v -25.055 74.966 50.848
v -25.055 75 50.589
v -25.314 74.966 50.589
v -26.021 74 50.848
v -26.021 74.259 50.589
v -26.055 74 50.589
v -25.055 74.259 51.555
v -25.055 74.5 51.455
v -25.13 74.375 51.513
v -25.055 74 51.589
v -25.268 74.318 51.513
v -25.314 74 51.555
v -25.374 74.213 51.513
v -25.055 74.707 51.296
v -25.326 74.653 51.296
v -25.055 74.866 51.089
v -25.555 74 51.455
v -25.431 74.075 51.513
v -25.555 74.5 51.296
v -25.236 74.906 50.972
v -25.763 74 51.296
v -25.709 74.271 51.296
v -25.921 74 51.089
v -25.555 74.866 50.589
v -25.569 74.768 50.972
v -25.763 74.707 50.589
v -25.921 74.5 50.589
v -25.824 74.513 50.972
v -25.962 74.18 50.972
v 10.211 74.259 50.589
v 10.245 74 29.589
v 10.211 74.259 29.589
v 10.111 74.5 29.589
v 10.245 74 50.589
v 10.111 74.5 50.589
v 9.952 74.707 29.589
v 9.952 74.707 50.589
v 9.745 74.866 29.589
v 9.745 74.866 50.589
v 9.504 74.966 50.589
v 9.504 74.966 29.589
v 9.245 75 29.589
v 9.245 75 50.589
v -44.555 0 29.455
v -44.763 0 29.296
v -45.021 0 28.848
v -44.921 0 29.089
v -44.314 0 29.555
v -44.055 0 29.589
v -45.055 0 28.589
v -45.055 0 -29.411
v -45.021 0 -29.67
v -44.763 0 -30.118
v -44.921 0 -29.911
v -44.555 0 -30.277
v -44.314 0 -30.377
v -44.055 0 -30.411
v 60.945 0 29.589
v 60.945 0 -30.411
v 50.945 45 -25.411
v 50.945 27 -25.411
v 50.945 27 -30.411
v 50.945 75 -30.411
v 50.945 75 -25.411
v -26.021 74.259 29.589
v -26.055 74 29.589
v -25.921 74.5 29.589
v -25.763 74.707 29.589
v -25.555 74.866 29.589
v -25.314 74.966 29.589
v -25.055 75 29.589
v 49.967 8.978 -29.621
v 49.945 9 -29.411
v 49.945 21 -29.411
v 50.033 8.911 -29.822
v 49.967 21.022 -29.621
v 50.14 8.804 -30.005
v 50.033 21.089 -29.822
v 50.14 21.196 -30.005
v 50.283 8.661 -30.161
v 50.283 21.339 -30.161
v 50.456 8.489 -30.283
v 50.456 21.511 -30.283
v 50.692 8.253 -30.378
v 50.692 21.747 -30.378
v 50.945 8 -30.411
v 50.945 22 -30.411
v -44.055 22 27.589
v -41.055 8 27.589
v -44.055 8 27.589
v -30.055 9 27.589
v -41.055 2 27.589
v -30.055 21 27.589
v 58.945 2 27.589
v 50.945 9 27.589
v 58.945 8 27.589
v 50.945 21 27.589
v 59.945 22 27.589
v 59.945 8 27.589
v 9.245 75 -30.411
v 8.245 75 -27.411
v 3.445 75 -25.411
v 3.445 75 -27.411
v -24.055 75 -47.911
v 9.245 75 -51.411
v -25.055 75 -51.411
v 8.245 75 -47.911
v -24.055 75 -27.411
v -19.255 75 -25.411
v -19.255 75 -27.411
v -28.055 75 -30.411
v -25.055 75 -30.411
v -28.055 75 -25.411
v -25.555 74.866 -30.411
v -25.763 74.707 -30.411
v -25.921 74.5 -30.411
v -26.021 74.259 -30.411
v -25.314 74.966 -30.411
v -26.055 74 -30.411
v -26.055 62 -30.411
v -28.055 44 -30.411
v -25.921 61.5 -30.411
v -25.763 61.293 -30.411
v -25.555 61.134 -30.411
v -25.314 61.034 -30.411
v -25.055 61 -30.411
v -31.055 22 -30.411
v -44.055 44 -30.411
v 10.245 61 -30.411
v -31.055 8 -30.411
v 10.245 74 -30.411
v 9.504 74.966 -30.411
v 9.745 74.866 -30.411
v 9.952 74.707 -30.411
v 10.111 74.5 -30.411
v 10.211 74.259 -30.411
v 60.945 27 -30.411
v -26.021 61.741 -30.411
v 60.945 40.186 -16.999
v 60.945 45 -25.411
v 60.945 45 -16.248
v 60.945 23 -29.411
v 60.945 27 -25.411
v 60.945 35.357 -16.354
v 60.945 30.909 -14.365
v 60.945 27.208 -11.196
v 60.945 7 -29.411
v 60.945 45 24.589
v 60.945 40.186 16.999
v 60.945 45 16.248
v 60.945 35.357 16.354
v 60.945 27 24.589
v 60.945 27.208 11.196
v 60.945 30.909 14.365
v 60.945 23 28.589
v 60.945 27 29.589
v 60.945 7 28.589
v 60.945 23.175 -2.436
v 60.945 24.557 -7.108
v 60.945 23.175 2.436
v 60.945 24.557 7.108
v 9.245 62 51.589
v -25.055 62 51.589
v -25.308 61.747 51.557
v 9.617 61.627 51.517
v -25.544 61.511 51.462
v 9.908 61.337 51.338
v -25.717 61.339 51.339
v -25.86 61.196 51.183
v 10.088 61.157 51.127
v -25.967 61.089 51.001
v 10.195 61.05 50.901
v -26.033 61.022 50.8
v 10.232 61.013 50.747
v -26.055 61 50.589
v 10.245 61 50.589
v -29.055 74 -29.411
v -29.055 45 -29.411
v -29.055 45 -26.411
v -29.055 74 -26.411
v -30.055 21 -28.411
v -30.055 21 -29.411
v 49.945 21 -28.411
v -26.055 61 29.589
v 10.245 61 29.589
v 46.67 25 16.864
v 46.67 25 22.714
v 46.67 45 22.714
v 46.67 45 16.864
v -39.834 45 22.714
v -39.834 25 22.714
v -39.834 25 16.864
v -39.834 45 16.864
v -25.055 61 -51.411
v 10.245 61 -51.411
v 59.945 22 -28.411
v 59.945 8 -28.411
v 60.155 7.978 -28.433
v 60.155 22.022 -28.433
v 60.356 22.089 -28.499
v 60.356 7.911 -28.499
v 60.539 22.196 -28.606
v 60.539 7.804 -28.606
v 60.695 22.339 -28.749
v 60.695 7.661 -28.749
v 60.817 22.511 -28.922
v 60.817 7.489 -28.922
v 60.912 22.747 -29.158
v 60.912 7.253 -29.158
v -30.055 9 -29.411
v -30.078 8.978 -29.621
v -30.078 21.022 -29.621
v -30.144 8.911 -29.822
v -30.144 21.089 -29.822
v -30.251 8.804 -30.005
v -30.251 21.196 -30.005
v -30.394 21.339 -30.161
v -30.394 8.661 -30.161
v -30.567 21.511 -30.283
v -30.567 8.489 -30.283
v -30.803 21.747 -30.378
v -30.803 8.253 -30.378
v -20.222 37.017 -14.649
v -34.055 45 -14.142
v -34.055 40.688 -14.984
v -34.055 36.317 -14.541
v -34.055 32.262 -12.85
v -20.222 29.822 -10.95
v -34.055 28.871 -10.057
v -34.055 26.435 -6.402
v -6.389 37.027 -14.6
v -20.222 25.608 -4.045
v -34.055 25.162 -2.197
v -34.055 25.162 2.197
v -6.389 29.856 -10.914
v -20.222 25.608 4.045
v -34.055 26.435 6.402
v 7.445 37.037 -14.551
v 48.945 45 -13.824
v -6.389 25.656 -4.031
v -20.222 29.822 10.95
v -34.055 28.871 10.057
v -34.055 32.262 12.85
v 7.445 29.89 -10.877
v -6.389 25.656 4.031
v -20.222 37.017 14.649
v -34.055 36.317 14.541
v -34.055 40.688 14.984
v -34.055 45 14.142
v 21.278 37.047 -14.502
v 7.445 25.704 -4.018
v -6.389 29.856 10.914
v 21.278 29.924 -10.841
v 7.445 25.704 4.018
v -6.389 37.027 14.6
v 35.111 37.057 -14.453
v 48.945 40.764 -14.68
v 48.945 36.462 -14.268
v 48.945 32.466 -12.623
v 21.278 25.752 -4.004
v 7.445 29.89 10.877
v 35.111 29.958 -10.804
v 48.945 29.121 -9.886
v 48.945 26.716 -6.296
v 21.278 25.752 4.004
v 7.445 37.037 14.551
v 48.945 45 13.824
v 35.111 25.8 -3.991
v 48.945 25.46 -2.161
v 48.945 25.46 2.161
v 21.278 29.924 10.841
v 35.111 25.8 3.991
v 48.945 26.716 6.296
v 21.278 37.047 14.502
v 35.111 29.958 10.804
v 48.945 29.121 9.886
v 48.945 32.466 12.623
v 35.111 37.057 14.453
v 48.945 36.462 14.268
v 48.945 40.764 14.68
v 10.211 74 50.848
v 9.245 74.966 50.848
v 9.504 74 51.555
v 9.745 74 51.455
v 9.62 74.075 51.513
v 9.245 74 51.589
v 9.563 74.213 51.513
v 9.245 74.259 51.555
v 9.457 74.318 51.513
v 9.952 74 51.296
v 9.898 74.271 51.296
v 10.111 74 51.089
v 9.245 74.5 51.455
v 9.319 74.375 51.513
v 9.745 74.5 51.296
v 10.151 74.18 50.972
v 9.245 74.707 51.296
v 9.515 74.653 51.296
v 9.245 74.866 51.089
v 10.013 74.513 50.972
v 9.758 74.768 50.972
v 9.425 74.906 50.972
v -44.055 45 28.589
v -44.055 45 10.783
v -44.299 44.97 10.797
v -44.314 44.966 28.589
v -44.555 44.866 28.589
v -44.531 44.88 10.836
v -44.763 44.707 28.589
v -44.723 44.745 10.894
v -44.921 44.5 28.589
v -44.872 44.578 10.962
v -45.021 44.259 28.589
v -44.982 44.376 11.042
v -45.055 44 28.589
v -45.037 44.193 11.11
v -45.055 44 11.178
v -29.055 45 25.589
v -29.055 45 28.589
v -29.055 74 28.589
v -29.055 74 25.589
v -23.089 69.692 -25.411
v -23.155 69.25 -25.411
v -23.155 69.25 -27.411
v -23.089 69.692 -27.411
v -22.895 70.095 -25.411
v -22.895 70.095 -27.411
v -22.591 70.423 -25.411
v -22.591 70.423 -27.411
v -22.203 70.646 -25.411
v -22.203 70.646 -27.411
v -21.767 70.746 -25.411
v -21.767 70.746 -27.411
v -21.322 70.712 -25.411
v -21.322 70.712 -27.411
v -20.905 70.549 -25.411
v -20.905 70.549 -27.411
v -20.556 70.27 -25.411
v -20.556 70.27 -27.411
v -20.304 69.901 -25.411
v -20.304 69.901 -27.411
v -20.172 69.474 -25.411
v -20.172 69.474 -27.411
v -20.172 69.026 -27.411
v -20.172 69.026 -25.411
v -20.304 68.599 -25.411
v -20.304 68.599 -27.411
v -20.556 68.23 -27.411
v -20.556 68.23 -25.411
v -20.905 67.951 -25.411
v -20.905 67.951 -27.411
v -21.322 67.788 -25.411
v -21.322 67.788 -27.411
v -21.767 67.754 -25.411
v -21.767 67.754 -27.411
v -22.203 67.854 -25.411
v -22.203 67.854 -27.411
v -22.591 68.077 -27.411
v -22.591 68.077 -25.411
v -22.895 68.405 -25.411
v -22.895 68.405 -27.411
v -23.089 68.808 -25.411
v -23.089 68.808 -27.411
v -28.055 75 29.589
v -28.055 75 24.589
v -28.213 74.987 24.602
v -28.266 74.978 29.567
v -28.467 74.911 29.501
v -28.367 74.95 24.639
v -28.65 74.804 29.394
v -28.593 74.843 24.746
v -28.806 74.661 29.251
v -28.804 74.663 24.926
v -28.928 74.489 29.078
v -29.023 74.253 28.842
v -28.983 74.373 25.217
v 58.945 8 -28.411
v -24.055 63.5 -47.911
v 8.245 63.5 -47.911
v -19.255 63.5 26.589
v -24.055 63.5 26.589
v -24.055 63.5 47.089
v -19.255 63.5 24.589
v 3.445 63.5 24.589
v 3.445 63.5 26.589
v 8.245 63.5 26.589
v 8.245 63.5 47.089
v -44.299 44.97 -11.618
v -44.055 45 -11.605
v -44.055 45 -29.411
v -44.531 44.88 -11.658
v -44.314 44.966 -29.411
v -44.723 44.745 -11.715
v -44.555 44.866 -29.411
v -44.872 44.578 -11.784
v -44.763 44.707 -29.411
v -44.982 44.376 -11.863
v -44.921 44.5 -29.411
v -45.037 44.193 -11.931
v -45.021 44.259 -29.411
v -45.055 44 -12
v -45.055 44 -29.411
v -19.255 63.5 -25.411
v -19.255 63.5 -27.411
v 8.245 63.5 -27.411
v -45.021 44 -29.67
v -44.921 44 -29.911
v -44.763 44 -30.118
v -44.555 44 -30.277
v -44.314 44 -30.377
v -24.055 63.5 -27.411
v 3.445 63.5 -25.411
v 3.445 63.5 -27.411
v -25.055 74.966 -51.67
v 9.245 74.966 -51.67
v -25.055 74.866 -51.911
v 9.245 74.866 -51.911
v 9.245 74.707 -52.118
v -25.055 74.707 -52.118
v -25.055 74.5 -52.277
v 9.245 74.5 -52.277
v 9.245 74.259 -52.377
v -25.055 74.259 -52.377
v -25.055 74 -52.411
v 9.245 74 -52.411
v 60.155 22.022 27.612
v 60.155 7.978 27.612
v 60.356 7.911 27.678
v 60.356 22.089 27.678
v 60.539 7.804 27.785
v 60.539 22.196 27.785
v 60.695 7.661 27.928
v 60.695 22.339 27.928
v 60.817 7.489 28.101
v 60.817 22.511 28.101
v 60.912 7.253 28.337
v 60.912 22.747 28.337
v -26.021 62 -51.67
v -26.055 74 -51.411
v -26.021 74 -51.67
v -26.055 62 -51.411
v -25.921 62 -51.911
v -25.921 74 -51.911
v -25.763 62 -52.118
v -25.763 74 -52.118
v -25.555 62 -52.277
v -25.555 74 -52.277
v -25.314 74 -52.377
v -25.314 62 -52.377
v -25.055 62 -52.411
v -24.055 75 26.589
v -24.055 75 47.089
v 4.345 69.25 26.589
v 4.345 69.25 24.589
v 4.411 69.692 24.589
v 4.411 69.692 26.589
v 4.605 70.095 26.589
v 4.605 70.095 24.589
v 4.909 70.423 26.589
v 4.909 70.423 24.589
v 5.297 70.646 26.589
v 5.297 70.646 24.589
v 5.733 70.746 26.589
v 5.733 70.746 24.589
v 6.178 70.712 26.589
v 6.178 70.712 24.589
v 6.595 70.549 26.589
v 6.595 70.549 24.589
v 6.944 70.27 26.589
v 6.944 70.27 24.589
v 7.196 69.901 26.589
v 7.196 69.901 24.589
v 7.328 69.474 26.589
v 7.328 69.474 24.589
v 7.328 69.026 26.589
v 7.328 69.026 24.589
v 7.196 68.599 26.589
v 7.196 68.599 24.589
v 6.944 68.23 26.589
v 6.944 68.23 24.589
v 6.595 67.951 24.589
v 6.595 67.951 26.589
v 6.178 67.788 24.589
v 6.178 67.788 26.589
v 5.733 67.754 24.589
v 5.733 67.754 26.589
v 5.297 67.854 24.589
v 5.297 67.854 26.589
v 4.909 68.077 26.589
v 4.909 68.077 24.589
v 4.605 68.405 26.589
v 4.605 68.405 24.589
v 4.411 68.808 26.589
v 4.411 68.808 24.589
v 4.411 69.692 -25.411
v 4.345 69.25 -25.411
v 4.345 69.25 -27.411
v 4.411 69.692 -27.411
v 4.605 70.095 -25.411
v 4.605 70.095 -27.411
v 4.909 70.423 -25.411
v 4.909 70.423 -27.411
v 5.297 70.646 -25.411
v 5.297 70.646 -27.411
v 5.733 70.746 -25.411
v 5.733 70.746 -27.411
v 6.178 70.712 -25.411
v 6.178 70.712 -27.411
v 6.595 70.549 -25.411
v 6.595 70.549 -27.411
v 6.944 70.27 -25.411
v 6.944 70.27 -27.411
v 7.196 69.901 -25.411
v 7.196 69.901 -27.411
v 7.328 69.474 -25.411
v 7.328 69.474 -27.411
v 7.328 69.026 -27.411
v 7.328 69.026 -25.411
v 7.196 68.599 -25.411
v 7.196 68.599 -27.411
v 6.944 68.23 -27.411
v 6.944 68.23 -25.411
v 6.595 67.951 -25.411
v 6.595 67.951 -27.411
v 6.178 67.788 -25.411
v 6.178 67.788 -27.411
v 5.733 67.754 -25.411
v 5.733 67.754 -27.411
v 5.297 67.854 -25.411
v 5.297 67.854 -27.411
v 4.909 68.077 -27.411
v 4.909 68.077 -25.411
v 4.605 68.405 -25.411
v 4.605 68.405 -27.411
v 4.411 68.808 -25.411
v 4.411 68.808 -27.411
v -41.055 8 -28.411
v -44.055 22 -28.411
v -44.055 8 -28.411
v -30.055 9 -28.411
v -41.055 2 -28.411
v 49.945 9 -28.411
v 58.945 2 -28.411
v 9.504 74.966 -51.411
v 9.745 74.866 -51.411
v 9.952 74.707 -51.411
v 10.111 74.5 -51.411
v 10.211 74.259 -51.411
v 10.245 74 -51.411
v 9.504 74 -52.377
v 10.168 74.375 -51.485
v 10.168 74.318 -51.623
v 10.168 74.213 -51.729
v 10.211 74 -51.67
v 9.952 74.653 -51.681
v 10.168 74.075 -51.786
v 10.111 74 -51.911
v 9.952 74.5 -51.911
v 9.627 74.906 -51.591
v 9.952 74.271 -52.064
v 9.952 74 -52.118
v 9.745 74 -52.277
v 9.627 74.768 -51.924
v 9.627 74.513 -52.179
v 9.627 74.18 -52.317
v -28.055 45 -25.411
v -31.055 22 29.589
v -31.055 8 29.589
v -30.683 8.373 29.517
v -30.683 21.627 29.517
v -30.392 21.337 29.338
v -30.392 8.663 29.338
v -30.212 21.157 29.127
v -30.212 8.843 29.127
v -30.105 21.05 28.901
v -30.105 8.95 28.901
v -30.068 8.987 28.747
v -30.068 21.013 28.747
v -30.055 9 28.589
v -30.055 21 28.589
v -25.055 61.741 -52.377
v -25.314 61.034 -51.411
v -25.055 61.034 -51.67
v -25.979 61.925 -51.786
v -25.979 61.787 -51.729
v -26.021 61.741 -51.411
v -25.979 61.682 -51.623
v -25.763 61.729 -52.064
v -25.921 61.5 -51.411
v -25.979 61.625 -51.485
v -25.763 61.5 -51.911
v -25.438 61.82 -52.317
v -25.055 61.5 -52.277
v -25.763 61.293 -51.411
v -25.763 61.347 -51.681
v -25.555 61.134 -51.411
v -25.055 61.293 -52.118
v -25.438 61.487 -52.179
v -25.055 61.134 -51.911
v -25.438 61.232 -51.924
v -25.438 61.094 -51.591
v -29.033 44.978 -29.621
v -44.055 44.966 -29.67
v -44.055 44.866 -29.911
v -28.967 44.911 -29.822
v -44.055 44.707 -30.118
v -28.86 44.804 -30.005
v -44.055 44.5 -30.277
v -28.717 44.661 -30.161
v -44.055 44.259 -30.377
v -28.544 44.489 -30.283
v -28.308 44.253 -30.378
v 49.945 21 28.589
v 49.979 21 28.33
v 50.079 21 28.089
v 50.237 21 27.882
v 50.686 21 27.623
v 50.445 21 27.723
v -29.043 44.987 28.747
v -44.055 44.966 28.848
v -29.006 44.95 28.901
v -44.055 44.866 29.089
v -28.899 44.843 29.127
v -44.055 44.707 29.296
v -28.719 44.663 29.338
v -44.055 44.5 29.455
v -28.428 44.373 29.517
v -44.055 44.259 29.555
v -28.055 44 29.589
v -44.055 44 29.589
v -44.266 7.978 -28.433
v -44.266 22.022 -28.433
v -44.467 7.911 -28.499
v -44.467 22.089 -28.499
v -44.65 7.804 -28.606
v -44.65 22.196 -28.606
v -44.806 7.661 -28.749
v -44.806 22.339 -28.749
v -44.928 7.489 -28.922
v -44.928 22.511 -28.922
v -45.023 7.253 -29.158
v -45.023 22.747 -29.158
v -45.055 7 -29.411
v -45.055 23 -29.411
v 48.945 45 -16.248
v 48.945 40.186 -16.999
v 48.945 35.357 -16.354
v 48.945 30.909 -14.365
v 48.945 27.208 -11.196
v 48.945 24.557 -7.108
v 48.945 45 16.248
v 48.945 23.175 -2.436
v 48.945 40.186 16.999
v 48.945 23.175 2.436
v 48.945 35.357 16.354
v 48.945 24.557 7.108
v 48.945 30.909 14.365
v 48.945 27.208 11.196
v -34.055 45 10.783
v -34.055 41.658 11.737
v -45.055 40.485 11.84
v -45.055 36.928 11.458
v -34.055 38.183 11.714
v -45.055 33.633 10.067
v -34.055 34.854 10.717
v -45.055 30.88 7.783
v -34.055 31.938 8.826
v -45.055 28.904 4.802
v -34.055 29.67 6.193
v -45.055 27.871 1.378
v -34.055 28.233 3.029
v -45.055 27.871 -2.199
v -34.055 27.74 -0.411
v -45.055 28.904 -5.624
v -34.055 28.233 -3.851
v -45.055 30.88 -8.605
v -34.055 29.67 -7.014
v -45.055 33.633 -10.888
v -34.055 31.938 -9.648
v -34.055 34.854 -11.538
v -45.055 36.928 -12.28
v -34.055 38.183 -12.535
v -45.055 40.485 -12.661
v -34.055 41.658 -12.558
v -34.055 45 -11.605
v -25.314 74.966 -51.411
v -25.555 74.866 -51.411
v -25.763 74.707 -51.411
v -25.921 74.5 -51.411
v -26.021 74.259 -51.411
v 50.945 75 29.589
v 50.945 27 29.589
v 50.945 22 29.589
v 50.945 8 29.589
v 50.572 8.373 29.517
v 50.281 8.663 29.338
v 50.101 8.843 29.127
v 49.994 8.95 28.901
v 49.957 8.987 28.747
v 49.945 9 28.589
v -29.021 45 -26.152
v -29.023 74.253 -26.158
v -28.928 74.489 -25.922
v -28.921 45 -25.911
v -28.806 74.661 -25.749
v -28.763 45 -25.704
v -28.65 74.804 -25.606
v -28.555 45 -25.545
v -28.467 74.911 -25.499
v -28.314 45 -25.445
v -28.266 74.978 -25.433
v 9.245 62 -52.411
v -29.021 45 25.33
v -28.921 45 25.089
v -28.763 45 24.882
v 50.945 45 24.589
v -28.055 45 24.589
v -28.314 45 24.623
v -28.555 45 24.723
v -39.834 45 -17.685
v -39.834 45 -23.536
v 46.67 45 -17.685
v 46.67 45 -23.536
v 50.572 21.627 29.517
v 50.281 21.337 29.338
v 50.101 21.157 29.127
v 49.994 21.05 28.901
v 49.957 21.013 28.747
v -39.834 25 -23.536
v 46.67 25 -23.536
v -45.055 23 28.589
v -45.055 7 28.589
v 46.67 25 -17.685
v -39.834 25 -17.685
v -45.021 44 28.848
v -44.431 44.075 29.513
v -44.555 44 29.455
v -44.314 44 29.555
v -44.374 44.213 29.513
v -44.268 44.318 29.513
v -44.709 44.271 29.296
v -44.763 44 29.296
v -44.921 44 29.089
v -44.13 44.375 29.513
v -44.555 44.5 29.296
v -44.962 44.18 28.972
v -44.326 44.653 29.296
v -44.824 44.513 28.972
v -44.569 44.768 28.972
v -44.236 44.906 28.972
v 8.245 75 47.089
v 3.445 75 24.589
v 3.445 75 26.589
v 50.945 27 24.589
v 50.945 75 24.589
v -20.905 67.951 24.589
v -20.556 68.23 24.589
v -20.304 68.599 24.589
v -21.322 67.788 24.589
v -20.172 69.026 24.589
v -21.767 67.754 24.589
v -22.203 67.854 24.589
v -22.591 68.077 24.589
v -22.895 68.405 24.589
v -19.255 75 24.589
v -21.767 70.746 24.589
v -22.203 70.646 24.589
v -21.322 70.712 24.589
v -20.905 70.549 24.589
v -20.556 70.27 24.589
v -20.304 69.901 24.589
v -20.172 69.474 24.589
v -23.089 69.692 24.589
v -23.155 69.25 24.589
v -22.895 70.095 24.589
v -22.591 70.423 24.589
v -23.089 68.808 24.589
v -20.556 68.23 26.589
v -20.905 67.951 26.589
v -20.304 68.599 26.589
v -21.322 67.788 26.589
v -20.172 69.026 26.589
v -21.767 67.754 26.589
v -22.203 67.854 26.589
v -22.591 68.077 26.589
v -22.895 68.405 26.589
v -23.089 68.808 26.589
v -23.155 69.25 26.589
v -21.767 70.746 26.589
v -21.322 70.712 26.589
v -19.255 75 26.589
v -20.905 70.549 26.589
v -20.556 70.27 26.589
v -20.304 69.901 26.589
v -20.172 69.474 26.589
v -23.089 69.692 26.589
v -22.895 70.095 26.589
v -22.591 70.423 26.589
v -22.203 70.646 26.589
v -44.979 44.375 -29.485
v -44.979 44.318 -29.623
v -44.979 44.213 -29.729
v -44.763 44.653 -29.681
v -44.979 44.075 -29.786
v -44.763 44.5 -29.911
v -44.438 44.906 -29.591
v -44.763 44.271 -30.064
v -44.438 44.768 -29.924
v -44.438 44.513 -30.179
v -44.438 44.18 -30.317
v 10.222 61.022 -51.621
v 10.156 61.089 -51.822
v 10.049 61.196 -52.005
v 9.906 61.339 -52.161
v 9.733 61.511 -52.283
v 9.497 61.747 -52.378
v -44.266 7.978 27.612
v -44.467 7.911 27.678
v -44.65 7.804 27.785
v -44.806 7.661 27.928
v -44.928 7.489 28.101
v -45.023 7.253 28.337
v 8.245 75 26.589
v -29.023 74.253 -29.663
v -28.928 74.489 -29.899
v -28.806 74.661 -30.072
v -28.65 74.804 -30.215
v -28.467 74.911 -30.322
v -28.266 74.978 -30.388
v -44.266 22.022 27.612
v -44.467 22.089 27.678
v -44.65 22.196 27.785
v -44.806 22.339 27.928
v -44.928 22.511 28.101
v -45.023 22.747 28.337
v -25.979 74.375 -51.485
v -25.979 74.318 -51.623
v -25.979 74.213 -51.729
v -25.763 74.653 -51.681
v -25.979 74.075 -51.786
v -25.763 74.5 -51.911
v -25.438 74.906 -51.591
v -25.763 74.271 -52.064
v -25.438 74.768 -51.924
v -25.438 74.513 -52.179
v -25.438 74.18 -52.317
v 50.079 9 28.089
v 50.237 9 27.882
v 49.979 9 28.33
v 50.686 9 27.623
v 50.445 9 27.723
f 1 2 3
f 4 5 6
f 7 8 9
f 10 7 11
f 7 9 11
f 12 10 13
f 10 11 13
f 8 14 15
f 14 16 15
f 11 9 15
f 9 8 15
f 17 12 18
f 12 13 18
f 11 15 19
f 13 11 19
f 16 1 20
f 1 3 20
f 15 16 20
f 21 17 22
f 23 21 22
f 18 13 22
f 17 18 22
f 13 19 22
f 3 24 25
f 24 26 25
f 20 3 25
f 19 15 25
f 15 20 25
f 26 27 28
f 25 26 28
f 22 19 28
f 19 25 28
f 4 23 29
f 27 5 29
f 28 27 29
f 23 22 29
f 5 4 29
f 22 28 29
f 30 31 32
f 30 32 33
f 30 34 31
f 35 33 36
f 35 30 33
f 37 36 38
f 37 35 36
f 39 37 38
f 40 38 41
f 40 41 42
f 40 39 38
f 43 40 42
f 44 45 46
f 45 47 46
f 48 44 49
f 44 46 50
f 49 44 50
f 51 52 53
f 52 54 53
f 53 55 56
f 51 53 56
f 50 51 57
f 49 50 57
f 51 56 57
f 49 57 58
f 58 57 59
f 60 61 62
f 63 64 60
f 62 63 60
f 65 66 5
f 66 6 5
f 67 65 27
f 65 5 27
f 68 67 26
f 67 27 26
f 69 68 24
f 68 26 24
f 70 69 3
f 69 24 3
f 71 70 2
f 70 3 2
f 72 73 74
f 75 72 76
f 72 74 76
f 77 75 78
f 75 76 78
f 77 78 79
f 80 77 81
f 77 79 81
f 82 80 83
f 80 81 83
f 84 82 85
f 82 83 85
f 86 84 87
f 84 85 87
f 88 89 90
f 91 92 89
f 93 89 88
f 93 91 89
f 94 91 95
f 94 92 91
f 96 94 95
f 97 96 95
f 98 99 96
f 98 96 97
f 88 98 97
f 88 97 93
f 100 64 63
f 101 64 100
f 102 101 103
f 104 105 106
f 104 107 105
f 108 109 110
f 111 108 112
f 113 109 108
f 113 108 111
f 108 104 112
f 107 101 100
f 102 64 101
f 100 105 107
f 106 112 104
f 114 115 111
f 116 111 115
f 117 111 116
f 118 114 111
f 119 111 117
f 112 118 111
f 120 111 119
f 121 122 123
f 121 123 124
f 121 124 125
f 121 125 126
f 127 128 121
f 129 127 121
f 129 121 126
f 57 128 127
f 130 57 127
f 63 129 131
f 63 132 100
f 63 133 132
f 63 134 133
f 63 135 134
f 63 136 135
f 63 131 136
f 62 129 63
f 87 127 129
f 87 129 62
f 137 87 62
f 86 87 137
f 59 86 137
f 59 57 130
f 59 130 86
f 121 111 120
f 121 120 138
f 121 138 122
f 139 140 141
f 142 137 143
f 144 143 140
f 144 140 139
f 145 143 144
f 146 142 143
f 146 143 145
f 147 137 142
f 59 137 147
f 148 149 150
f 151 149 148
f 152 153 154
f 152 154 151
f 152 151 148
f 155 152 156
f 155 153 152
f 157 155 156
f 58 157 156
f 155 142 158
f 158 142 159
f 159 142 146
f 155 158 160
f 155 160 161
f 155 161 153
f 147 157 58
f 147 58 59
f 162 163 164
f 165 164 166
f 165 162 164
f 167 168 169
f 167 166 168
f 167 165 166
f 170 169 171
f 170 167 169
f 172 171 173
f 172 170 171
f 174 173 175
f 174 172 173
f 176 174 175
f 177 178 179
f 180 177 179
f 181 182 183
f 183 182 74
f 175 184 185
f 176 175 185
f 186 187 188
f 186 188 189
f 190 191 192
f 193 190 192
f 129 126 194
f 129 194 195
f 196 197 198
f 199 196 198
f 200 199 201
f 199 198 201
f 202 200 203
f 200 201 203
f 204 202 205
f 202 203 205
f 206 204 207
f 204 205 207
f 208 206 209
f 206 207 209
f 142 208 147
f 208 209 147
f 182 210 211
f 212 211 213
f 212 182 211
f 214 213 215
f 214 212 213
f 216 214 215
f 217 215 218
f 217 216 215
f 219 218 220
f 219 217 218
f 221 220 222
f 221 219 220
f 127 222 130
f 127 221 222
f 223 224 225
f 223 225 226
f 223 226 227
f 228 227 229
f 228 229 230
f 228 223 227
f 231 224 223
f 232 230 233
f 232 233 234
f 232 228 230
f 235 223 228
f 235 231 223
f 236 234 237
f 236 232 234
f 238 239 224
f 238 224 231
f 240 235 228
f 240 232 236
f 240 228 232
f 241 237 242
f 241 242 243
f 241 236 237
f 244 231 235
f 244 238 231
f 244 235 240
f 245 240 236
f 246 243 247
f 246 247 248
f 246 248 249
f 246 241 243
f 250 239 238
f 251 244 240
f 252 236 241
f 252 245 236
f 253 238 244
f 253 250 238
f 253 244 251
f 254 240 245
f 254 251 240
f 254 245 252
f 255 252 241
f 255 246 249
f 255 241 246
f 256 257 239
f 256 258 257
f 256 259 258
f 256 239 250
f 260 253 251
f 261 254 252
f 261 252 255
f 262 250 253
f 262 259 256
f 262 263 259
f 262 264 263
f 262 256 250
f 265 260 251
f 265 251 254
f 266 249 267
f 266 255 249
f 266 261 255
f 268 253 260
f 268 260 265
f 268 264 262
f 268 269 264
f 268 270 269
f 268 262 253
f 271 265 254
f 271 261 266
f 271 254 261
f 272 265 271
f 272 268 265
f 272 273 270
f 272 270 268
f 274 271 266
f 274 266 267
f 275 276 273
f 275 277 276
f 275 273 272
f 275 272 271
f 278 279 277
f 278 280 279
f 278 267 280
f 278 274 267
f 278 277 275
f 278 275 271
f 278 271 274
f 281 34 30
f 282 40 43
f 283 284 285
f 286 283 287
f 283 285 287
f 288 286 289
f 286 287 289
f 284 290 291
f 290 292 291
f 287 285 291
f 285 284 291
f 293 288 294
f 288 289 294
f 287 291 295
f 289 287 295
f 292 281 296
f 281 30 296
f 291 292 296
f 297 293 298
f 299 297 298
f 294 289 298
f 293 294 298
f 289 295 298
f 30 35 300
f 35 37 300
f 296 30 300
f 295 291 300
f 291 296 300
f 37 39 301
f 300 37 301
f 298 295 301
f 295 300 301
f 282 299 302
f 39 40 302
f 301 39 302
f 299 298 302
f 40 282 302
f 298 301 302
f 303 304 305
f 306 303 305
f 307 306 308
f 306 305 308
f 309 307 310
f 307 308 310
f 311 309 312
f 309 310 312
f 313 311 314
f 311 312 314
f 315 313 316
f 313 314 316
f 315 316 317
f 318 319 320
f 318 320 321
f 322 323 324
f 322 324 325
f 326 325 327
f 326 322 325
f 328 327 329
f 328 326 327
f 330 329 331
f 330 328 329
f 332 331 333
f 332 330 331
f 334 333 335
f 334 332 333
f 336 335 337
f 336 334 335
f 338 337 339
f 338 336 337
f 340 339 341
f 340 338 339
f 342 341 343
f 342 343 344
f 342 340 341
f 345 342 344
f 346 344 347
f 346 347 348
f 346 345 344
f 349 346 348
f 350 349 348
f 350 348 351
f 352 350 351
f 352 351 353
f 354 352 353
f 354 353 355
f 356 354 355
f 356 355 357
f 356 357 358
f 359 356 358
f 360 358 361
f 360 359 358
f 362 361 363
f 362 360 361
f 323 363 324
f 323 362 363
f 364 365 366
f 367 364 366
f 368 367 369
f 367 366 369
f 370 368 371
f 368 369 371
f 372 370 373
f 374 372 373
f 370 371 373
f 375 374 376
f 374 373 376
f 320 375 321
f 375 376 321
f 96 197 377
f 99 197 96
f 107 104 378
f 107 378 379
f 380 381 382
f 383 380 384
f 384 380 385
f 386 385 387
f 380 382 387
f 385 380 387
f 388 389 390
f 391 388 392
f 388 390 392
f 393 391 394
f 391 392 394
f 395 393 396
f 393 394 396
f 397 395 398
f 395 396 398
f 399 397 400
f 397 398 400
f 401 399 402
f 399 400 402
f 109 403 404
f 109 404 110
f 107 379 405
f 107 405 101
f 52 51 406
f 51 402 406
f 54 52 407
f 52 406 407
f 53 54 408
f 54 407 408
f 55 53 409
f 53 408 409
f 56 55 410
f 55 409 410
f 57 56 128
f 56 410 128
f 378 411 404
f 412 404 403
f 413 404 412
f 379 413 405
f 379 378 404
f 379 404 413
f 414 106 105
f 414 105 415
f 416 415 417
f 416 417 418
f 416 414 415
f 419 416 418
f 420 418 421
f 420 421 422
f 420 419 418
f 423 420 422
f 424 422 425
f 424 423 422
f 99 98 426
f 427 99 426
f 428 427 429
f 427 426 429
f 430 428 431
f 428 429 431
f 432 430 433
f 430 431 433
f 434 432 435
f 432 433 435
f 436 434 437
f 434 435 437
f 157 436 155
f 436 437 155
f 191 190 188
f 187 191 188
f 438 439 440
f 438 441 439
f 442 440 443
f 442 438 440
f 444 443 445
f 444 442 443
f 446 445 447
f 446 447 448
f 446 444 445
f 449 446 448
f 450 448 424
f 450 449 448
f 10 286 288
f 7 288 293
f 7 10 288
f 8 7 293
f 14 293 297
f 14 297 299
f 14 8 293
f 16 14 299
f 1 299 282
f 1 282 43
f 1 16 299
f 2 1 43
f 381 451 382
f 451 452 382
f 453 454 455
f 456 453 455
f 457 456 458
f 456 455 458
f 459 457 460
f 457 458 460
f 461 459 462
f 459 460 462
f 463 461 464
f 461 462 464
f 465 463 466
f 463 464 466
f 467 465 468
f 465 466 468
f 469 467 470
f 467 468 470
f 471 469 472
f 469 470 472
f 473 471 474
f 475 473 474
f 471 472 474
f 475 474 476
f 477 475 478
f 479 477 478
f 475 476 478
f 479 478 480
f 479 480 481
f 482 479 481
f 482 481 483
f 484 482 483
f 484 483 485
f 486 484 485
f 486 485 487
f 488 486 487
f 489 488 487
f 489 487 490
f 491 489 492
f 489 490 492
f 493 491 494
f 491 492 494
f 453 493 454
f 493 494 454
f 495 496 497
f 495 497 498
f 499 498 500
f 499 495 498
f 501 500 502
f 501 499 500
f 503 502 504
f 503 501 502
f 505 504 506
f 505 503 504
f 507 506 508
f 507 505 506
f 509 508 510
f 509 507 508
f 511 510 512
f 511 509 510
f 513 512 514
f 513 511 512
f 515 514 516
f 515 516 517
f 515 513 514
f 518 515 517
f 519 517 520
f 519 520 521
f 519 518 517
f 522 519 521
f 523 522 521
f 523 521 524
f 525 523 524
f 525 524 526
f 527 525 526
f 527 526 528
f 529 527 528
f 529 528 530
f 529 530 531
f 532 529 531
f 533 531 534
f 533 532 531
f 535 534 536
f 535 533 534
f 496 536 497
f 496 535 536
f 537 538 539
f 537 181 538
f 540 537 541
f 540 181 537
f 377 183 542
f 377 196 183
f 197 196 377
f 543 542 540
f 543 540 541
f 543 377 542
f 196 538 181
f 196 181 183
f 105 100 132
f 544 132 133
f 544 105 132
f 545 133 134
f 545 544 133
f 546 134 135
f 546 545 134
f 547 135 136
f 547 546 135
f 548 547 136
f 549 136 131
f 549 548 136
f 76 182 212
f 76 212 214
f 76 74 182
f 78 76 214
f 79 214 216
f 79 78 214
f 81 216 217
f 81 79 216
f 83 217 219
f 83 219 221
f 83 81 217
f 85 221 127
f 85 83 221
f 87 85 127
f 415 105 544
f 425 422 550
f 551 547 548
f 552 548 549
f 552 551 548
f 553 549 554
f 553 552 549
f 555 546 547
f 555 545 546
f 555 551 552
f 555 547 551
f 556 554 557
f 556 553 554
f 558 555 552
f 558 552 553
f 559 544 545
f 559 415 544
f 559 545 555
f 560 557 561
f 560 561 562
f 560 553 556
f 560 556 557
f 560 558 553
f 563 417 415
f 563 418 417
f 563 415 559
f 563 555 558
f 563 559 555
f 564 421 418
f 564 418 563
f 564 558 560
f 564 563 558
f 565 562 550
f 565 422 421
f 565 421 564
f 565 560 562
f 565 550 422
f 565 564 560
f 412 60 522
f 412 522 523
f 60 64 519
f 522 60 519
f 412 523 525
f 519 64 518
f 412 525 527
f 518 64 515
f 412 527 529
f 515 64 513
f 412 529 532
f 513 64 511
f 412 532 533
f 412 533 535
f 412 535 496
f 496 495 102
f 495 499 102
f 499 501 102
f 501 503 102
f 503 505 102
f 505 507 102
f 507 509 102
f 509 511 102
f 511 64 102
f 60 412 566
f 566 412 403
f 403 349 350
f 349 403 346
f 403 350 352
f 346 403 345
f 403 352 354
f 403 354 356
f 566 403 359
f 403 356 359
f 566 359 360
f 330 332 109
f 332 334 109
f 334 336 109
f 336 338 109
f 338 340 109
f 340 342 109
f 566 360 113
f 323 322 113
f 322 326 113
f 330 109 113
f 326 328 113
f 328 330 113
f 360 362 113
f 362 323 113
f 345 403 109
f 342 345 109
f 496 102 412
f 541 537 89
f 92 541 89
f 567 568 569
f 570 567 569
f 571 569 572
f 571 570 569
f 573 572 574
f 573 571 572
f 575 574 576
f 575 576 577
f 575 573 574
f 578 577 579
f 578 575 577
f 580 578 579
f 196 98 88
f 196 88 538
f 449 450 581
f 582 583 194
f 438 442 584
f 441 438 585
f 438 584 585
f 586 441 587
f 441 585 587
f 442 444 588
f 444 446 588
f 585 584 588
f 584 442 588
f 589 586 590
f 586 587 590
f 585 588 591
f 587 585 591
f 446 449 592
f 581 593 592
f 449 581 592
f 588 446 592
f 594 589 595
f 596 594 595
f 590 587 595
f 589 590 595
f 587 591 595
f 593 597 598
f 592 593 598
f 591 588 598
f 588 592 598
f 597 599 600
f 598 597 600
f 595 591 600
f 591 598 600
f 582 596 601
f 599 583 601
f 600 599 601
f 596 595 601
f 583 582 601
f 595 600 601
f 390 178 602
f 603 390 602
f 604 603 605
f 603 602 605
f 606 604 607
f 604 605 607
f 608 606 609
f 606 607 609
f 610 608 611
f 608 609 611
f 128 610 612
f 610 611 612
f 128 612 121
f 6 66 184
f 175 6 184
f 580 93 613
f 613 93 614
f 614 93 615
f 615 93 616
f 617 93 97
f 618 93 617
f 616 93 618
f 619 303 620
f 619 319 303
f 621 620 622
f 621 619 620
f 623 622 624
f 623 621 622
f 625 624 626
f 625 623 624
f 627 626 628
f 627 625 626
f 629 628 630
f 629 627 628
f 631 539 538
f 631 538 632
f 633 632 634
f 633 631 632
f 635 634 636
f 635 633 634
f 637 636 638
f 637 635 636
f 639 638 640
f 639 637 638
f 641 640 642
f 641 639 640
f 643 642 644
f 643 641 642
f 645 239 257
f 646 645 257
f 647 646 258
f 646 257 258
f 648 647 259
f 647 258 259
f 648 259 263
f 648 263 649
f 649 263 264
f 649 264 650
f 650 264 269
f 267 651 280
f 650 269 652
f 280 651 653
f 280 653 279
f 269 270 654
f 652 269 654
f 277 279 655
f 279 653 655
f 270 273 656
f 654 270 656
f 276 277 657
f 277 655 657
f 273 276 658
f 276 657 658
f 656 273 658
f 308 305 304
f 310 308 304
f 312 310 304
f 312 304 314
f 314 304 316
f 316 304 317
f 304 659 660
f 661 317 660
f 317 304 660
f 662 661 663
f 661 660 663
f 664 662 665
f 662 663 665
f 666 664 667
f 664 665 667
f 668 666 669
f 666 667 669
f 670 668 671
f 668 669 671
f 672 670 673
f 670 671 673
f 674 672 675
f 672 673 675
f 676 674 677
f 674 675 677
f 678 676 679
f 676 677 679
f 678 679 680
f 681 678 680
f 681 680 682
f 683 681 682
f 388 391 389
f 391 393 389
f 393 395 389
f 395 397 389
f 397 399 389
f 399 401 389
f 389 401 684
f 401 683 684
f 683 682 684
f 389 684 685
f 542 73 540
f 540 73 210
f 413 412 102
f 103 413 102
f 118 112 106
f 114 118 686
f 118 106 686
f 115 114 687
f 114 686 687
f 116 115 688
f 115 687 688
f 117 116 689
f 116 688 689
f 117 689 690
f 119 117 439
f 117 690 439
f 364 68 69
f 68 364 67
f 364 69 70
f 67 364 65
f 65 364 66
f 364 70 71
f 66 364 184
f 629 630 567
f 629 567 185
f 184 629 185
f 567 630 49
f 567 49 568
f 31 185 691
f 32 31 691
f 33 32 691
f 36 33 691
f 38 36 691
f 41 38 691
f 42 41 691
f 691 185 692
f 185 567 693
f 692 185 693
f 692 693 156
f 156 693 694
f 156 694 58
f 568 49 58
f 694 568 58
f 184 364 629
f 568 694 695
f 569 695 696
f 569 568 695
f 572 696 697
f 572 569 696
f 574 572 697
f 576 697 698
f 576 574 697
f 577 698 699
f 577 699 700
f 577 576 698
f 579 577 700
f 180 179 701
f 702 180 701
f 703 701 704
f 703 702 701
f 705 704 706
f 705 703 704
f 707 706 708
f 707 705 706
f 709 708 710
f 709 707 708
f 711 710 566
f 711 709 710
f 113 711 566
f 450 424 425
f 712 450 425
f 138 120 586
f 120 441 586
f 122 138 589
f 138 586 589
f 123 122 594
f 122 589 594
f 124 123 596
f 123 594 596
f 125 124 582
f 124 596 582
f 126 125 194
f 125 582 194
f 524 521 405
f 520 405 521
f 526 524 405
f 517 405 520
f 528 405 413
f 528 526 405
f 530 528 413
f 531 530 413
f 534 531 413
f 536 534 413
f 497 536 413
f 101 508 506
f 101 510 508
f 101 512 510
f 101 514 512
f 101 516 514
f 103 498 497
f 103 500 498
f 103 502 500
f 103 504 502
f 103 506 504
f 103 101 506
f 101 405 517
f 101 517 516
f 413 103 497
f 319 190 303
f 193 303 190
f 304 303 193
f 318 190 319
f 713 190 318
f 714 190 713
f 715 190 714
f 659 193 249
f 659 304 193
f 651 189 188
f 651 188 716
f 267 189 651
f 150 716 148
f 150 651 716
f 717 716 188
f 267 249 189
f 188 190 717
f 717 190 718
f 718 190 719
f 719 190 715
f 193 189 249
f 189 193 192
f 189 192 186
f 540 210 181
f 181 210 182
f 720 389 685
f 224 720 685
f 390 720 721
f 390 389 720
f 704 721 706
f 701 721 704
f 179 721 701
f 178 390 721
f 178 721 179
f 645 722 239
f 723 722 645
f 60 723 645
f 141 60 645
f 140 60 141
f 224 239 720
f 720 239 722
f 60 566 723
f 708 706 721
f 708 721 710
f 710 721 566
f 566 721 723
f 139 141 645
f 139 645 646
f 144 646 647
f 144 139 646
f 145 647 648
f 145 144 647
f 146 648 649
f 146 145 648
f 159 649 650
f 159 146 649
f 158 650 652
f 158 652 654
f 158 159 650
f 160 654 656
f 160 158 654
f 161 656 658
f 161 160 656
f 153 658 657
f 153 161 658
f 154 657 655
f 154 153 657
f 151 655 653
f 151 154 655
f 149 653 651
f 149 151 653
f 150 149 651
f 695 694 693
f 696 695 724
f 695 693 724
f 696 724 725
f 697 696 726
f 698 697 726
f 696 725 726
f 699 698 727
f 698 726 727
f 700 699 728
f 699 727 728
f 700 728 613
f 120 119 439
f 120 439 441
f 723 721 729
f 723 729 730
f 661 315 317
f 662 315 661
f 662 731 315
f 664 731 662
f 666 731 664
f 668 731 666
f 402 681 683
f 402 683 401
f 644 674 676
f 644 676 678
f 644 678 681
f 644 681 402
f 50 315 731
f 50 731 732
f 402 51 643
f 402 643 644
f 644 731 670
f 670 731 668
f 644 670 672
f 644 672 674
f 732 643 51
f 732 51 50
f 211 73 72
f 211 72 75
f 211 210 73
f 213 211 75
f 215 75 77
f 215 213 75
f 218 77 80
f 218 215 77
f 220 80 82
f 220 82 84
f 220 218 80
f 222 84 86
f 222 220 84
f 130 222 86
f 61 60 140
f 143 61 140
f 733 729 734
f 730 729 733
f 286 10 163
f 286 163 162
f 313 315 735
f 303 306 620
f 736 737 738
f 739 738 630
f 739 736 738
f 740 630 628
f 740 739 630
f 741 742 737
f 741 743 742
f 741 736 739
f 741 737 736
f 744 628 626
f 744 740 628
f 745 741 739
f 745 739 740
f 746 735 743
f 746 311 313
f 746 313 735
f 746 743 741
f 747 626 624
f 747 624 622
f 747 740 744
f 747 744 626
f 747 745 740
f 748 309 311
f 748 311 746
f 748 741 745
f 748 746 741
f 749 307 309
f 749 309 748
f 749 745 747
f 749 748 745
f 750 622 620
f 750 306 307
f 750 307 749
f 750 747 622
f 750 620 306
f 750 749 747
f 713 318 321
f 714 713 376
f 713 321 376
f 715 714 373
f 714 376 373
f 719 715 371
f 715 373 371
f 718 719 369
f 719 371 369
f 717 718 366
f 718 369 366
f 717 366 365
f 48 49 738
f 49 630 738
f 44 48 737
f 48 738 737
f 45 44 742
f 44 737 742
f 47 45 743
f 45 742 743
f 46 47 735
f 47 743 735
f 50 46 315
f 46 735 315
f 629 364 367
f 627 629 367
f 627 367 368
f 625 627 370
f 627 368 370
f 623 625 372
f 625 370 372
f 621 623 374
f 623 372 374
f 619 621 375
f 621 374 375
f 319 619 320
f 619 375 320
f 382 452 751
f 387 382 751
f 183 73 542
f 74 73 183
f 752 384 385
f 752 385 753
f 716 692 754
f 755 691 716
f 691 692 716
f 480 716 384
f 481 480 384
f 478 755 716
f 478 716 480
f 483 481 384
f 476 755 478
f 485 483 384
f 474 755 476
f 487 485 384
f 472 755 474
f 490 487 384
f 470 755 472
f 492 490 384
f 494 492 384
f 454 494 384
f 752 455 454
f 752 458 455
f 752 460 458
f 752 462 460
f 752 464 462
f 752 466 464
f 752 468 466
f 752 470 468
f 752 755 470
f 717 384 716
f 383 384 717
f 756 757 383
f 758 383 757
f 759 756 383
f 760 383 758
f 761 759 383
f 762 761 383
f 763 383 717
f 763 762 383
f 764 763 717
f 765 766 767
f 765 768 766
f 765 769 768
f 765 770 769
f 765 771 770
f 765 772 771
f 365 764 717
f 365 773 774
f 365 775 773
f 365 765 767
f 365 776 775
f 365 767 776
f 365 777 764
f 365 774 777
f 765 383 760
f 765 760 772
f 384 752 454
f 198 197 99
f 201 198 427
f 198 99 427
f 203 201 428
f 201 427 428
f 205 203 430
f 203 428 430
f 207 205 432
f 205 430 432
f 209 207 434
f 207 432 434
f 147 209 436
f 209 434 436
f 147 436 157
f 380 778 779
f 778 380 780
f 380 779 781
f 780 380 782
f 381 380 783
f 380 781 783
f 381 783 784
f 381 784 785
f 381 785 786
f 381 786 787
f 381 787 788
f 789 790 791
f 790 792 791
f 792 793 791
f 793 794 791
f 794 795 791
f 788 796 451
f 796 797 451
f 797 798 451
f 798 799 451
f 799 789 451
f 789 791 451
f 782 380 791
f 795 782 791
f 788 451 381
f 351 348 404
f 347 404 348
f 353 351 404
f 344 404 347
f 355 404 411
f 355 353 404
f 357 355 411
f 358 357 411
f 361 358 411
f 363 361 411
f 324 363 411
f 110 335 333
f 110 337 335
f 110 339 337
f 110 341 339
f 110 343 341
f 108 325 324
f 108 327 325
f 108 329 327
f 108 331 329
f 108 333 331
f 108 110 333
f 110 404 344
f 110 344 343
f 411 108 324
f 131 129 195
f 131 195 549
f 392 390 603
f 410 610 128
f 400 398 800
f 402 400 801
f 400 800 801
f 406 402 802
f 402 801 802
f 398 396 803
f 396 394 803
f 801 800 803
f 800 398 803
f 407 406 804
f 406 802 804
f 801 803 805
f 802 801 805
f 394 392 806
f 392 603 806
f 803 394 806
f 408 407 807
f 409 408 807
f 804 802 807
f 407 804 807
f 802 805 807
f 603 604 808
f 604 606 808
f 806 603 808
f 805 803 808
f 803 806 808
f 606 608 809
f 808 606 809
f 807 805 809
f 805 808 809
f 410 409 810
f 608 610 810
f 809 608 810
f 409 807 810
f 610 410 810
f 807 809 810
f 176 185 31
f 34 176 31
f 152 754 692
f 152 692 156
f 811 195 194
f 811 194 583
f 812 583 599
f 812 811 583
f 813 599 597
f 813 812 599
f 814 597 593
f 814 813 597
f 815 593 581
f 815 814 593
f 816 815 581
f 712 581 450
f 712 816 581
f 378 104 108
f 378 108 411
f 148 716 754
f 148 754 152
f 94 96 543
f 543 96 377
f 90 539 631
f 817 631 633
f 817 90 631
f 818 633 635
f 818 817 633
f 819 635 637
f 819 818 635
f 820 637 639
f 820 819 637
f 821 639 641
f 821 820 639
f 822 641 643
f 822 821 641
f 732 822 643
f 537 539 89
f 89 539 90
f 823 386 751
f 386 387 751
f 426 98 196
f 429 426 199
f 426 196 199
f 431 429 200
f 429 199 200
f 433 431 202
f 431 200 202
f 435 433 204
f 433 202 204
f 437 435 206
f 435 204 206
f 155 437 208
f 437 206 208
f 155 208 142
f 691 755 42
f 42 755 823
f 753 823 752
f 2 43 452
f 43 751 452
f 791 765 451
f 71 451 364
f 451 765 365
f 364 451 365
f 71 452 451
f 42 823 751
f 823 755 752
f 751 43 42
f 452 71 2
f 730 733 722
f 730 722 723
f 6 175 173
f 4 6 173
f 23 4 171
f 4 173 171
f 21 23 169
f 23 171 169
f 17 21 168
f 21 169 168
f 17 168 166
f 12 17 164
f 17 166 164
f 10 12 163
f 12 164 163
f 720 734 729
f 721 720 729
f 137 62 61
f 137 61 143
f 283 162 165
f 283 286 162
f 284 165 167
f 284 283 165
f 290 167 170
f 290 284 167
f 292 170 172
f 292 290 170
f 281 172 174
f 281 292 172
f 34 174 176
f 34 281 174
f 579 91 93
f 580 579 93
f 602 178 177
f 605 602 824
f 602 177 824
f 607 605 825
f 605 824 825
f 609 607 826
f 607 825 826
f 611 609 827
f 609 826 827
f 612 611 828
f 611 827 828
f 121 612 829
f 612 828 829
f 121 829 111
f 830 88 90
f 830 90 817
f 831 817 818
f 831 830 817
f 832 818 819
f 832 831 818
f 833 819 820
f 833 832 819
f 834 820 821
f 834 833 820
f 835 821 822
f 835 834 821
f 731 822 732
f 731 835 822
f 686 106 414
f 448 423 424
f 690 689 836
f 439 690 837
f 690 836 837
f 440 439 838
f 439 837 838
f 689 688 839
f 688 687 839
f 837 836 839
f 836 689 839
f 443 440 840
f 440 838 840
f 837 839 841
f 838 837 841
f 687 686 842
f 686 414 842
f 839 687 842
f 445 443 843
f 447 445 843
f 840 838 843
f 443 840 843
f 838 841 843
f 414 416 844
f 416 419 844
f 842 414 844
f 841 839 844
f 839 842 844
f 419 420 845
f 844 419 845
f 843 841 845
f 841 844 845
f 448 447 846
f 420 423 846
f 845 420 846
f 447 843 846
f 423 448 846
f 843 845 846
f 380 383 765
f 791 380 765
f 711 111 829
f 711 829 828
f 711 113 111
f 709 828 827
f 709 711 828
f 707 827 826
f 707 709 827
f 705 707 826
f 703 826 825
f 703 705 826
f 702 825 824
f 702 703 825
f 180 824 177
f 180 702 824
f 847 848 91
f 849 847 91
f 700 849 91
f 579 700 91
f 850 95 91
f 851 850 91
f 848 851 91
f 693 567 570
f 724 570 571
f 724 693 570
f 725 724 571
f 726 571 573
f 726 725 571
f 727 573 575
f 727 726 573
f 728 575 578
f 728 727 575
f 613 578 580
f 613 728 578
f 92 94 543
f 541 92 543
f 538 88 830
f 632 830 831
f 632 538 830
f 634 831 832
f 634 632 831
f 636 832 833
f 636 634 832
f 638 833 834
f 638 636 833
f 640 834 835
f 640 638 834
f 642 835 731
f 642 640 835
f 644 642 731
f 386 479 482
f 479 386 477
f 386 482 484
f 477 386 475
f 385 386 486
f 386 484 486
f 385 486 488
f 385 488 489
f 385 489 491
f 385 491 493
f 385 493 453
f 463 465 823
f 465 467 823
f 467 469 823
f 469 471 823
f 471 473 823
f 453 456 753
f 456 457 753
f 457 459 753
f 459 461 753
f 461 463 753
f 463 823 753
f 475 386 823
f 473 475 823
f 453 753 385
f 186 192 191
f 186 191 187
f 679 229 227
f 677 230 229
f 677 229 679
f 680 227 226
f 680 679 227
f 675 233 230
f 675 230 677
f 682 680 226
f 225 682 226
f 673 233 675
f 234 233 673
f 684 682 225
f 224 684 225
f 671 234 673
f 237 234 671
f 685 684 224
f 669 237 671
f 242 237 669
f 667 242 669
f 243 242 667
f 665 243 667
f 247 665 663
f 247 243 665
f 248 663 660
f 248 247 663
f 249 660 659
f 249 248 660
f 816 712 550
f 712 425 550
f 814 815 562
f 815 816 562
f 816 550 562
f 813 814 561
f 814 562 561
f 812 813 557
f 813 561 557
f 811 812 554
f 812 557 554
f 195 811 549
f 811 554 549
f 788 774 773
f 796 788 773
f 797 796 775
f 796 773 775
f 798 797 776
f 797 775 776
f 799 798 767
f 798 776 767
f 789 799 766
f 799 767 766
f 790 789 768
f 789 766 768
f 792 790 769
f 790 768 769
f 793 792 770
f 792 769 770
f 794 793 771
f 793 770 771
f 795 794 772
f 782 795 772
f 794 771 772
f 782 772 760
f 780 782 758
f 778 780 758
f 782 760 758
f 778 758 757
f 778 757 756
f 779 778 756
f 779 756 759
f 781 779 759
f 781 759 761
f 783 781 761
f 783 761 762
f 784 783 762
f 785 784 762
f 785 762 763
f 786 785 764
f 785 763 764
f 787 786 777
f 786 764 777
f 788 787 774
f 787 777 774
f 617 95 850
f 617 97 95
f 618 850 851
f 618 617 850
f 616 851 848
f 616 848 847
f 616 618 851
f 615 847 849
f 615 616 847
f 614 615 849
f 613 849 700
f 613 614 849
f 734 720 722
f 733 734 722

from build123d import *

# Parameters (mm, degrees)
SKETCH_1_W             = 106
SKETCH_1_H             = 60
ARDUINO_DEPTH          = 45
ARDUINO_2_DEPTH        = 102
SKETCH_3_W             = 28
SKETCH_3_H             = 6
ARDUINO_3_DEPTH        = 2
SKETCH_4_W             = 40
SKETCH_4_H             = 12
ARDUINO_4_DEPTH        = 60
ARDUINO_5_DEPTH        = 5
SKETCH_11_W            = 12
SKETCH_11_H            = 17
SKETCH_13_R            = 12.26
CUT_EXTRUDE_2679_DEPTH = 110.42948373
SKETCH_25_W            = 90
SKETCH_25_H            = 5
EXTRUDE_3075_DEPTH     = 30
EXTRUDE_3668_DEPTH     = 22
CUT_EXTRUDE_1_REACH    = 115.751
CUT_EXTRUDE_2_DEPTH    = 17.5
SKETCH_28_W            = 4.8
SKETCH_28_H            = 11.5
SKETCH_28_R            = 1.5
EXTRUDE_4845_DEPTH     = 2
FILLET_1_R             = 1
SKETCH_30_W            = 10
SKETCH_30_H            = 5
CUT_EXTRUDE_2_2_DEPTH  = 48
SKETCH_32_W            = 86.504453115
SKETCH_32_H            = 5.850542723
SKETCH_32_H_2          = 5.850542722
CUT_EXTRUDE_4_DEPTH    = 20


with BuildPart() as part:
    # 草图1 → arduino (new body)
    with BuildSketch(Plane(origin=(0, 0, 0), x_dir=(1, 0, 0), z_dir=(0, 1, 0))):
        with Locations((7.944608655, 0.410719743)):
            Rectangle(SKETCH_1_W, SKETCH_1_H)
    extrude(amount=ARDUINO_DEPTH)

    # 草图2 → arduino 2 (cut)
    with BuildSketch(Plane(origin=(60.944608655, 0, 0), x_dir=(0, 0, -1), z_dir=(1, 0, 0))):
        Polygon((-27.589280257, 22), (28.410719743, 22), (28.410719743, 2), (0.410719743, 2), (-27.589280257, 2), align=None)
    extrude(amount=-ARDUINO_2_DEPTH, mode=Mode.SUBTRACT)

    # 草图3 → arduino 3 (add)
    with BuildSketch(Plane(origin=(60.944608655, 0, 0), x_dir=(0, 0, -1), z_dir=(1, 0, 0))):
        with Locations((14.410719743, 5)):
            Rectangle(SKETCH_3_W, SKETCH_3_H)
        with Locations((-13.589280257, 5)):
            Rectangle(SKETCH_3_W, SKETCH_3_H)
    extrude(amount=-ARDUINO_3_DEPTH)

    # 草图4 → arduino 4 (cut)
    with BuildSketch(Plane(origin=(0, 0, -30.410719743), x_dir=(-1, 0, 0), z_dir=(0, 0, -1))):
        with Locations((10.055391345, 15)):
            Rectangle(SKETCH_4_W, SKETCH_4_H)
        with Locations((-29.944608655, 15)):
            Rectangle(SKETCH_4_W, SKETCH_4_H)
    extrude(amount=-ARDUINO_4_DEPTH, mode=Mode.SUBTRACT)

    # 草图7 → arduino 5 (cut)
    with BuildSketch(Plane.ZY.offset(45.055391345)):
        Polygon((-0.410719743, 22), (-28.410719743, 22), (-28.410719743, 8), (27.589280257, 8), (27.589280257, 22), align=None)
    extrude(amount=-ARDUINO_5_DEPTH, mode=Mode.SUBTRACT)

    # 草图11 → Cut-Revolve 2344 (revolve, cut)
    with BuildSketch(Plane.XY):
        with Locations((54.944608655, 31.5)):
            Rectangle(SKETCH_11_W, SKETCH_11_H)
    revolve(axis=Axis((60.944608655, 40, 0), (-1, 0, 0)), mode=Mode.SUBTRACT)

    # 草图12 → Cut-Revolve 2556 (revolve, cut)
    with BuildSketch(Plane.XY):
        Polygon((48.944608655, 25.3), (48.944608655, 40), (-34.055391345, 40), (-34.055391345, 25), align=None)
    revolve(axis=Axis((48.944608655, 40, 0), (-1, 0, 0)), mode=Mode.SUBTRACT)

    # 草图13 → Cut-Extrude 2679 (cut, through all)
    with BuildSketch(Plane(origin=(-34.055391345, 0, 0), x_dir=(0, 0, -1), z_dir=(1, 0, 0))):
        with Locations((0.410719743, 40)):
            Circle(SKETCH_13_R)
    extrude(amount=-CUT_EXTRUDE_2679_DEPTH, mode=Mode.SUBTRACT)

    # 草图25 → Extrude 3075 (add)
    with BuildSketch(Plane(origin=(0, 45, 0), x_dir=(1, 0, 0), z_dir=(0, 1, 0))):
        with Locations((15.944608655, -27.089280257)):
            Rectangle(SKETCH_25_W, SKETCH_25_H)
    extrude_3075 = extrude(amount=EXTRUDE_3075_DEPTH)

    # 草图26 → Extrude 3668 (add)
    with BuildSketch(Plane.XY.offset(29.589280257)):
        Polygon((10.244608655, 61), (10.244608655, 75), (8.244608655, 75), (8.244608655, 63.5), (-24.055391345, 63.5), (-24.055391345, 75), (-26.055391345, 75), (-26.055391345, 61), align=None)
        Polygon((8.244608655, 63.5), (8.244608655, 75), (-16.055391345, 75), (-24.055391345, 75), (-24.055391345, 63.5), align=None)
    extrude_3668 = extrude(amount=EXTRUDE_3668_DEPTH)

    # 草图26<3> → 舵机舱切除1 (cut, up to next)
    with BuildSketch(Plane.XY.offset(29.589280257), mode=Mode.PRIVATE) as cut_extrude_1_sk1:
        Polygon((8.244608655, 63.5), (8.244608655, 75), (-16.055391345, 75), (-24.055391345, 75), (-24.055391345, 63.5), align=None)
    cut_extrude_1_tool1 = extrude(cut_extrude_1_sk1.sketch, amount=-CUT_EXTRUDE_1_REACH, mode=Mode.PRIVATE) & part.part
    cut_extrude_1 = cut_extrude_1_tool1.solids().sort_by_distance((-7.905391, 69.25, 29.58928))[0]
    add(cut_extrude_1, mode=Mode.SUBTRACT)

    # 草图26<4> → Cut-Extrude 2 (cut)
    with BuildSketch(Plane.XY.offset(29.589280257)):
        Polygon((8.244608655, 63.5), (8.244608655, 75), (-16.055391345, 75), (-24.055391345, 75), (-24.055391345, 63.5), align=None)
    cut_extrude_2 = extrude(amount=CUT_EXTRUDE_2_DEPTH, mode=Mode.SUBTRACT)

    # 草图28 → Extrude 4845 (add)
    # profile 1 of 2: a face of its own
    with BuildSketch(Plane(origin=(0, 0, 24.589280257), x_dir=(-1, 0, 0), z_dir=(0, 0, -1))):
        with Locations((-5.844608655, 69.25)):
            Rectangle(SKETCH_28_W, SKETCH_28_H)
        with Locations((-5.844608655, 69.25)):
            Circle(SKETCH_28_R, mode=Mode.SUBTRACT)
    # profile 2 of 2: a face of its own
    with BuildSketch(Plane(origin=(0, 0, 24.589280257), x_dir=(-1, 0, 0), z_dir=(0, 0, -1))):
        with Locations((21.655391345, 69.25)):
            Rectangle(SKETCH_28_W, SKETCH_28_H)
        with Locations((21.655391345, 69.25)):
            Circle(SKETCH_28_R, mode=Mode.SUBTRACT)
    extrude_4845 = extrude(amount=-EXTRUDE_4845_DEPTH)

    # Mirror 4928: Extrude 3075, Extrude 3668, 舵机舱切除1, Cut-Extrude 2, Extrude 4845 across plane
    add(extrude_3075.mirror(Plane(origin=(0, 0, -0.410719743), x_dir=(1, 0, 0), z_dir=(0, 0, -1))))
    add(extrude_3668.mirror(Plane(origin=(0, 0, -0.410719743), x_dir=(1, 0, 0), z_dir=(0, 0, -1))))
    add(cut_extrude_1.mirror(Plane(origin=(0, 0, -0.410719743), x_dir=(1, 0, 0), z_dir=(0, 0, -1))), mode=Mode.SUBTRACT)
    add(cut_extrude_2.mirror(Plane(origin=(0, 0, -0.410719743), x_dir=(1, 0, 0), z_dir=(0, 0, -1))), mode=Mode.SUBTRACT)
    add(extrude_4845.mirror(Plane(origin=(0, 0, -0.410719743), x_dir=(1, 0, 0), z_dir=(0, 0, -1))))

    # 变化圆角1
    fillet_1_edges = [part.edges().sort_by_distance(p)[0] for p in [
        (-45.055391345, 45, 20.18632412),
        (-29.055391345, 60, 24.589280257),
        (-29.055391345, 60, 29.589280257),
        (-29.055391345, 75, 27.089280257),
        (10.244608655, 75, 40.589280257),
        (-26.055391345, 75, 40.589280257),
        (10.244608655, 68, 51.589280257),
        (-7.905391345, 75, 51.589280257),
        (-26.055391345, 68, 51.589280257),
        (-7.905391345, 61, 51.589280257),
        (60.944608655, 22, -0.410719743),
        (-37.055391345, 45, -30.410719743),
        (-29.055391345, 75, -27.910719743),
        (-29.055391345, 60, -30.410719743),
        (-29.055391345, 60, -25.410719743),
        (-7.905391345, 75, -52.410719743),
        (-26.055391345, 75, -41.410719743),
        (10.244608655, 75, -41.410719743),
        (-7.905391345, 61, -52.410719743),
        (-26.055391345, 68, -52.410719743),
        (-26.055391345, 61, -41.410719743),
        (10.244608655, 68, -52.410719743),
        (60.944608655, 15, 27.589280257),
        (60.944608655, 15, -28.410719743),
        (60.944608655, 8, -0.410719743),
        (-45.055391345, 45, -21.007763606),
        (-30.055391345, 15, -30.410719743),
        (9.944608655, 9, -30.410719743),
        (49.944608655, 15, 27.589280257),
        (9.944608655, 21, 29.589280257),
        (49.944608655, 15, 29.589280257),
        (-30.055391345, 15, 29.589280257),
        (9.944608655, 9, 29.589280257),
        (9.944608655, 21, -30.410719743),
        (49.944608655, 15, -30.410719743),
        (-45.055391345, 22.5, -30.410719743),
        (-45.055391345, 22.5, 29.589280257),
        (-45.055391345, 22, -0.410719743),
        (-37.055391345, 45, 29.589280257),
        (-45.055391345, 15, 27.589280257),
        (-45.055391345, 15, -28.410719743),
        (-45.055391345, 8, -0.410719743),
    ]]
    fillet(fillet_1_edges, radius=FILLET_1_R - 0.0001)  # a hair under: the kernel refuses the full size

    # 草图30 → Cut-Extrude 2 2 (cut)
    with BuildSketch(Plane(origin=(0, 75, 0), x_dir=(1, 0, 0), z_dir=(0, 1, 0))):
        with Locations((55.944608655, -27.089280257)):
            Rectangle(SKETCH_30_W, SKETCH_30_H)
        with Locations((55.944608655, 27.910719743)):
            Rectangle(SKETCH_30_W, SKETCH_30_H)
    extrude(amount=-CUT_EXTRUDE_2_2_DEPTH, mode=Mode.SUBTRACT)

    # 草图32 → 切除-拉伸4 (cut)
    with BuildSketch(Plane(origin=(0, 45, 0), x_dir=(1, 0, 0), z_dir=(0, 1, 0))):
        with Locations((3.4181604, 20.610413575)):
            Rectangle(SKETCH_32_W, SKETCH_32_H)
        with Locations((3.4181604, -19.788974089)):
            Rectangle(SKETCH_32_W, SKETCH_32_H_2)
    extrude(amount=-CUT_EXTRUDE_4_DEPTH, mode=Mode.SUBTRACT)


solid = part.part
